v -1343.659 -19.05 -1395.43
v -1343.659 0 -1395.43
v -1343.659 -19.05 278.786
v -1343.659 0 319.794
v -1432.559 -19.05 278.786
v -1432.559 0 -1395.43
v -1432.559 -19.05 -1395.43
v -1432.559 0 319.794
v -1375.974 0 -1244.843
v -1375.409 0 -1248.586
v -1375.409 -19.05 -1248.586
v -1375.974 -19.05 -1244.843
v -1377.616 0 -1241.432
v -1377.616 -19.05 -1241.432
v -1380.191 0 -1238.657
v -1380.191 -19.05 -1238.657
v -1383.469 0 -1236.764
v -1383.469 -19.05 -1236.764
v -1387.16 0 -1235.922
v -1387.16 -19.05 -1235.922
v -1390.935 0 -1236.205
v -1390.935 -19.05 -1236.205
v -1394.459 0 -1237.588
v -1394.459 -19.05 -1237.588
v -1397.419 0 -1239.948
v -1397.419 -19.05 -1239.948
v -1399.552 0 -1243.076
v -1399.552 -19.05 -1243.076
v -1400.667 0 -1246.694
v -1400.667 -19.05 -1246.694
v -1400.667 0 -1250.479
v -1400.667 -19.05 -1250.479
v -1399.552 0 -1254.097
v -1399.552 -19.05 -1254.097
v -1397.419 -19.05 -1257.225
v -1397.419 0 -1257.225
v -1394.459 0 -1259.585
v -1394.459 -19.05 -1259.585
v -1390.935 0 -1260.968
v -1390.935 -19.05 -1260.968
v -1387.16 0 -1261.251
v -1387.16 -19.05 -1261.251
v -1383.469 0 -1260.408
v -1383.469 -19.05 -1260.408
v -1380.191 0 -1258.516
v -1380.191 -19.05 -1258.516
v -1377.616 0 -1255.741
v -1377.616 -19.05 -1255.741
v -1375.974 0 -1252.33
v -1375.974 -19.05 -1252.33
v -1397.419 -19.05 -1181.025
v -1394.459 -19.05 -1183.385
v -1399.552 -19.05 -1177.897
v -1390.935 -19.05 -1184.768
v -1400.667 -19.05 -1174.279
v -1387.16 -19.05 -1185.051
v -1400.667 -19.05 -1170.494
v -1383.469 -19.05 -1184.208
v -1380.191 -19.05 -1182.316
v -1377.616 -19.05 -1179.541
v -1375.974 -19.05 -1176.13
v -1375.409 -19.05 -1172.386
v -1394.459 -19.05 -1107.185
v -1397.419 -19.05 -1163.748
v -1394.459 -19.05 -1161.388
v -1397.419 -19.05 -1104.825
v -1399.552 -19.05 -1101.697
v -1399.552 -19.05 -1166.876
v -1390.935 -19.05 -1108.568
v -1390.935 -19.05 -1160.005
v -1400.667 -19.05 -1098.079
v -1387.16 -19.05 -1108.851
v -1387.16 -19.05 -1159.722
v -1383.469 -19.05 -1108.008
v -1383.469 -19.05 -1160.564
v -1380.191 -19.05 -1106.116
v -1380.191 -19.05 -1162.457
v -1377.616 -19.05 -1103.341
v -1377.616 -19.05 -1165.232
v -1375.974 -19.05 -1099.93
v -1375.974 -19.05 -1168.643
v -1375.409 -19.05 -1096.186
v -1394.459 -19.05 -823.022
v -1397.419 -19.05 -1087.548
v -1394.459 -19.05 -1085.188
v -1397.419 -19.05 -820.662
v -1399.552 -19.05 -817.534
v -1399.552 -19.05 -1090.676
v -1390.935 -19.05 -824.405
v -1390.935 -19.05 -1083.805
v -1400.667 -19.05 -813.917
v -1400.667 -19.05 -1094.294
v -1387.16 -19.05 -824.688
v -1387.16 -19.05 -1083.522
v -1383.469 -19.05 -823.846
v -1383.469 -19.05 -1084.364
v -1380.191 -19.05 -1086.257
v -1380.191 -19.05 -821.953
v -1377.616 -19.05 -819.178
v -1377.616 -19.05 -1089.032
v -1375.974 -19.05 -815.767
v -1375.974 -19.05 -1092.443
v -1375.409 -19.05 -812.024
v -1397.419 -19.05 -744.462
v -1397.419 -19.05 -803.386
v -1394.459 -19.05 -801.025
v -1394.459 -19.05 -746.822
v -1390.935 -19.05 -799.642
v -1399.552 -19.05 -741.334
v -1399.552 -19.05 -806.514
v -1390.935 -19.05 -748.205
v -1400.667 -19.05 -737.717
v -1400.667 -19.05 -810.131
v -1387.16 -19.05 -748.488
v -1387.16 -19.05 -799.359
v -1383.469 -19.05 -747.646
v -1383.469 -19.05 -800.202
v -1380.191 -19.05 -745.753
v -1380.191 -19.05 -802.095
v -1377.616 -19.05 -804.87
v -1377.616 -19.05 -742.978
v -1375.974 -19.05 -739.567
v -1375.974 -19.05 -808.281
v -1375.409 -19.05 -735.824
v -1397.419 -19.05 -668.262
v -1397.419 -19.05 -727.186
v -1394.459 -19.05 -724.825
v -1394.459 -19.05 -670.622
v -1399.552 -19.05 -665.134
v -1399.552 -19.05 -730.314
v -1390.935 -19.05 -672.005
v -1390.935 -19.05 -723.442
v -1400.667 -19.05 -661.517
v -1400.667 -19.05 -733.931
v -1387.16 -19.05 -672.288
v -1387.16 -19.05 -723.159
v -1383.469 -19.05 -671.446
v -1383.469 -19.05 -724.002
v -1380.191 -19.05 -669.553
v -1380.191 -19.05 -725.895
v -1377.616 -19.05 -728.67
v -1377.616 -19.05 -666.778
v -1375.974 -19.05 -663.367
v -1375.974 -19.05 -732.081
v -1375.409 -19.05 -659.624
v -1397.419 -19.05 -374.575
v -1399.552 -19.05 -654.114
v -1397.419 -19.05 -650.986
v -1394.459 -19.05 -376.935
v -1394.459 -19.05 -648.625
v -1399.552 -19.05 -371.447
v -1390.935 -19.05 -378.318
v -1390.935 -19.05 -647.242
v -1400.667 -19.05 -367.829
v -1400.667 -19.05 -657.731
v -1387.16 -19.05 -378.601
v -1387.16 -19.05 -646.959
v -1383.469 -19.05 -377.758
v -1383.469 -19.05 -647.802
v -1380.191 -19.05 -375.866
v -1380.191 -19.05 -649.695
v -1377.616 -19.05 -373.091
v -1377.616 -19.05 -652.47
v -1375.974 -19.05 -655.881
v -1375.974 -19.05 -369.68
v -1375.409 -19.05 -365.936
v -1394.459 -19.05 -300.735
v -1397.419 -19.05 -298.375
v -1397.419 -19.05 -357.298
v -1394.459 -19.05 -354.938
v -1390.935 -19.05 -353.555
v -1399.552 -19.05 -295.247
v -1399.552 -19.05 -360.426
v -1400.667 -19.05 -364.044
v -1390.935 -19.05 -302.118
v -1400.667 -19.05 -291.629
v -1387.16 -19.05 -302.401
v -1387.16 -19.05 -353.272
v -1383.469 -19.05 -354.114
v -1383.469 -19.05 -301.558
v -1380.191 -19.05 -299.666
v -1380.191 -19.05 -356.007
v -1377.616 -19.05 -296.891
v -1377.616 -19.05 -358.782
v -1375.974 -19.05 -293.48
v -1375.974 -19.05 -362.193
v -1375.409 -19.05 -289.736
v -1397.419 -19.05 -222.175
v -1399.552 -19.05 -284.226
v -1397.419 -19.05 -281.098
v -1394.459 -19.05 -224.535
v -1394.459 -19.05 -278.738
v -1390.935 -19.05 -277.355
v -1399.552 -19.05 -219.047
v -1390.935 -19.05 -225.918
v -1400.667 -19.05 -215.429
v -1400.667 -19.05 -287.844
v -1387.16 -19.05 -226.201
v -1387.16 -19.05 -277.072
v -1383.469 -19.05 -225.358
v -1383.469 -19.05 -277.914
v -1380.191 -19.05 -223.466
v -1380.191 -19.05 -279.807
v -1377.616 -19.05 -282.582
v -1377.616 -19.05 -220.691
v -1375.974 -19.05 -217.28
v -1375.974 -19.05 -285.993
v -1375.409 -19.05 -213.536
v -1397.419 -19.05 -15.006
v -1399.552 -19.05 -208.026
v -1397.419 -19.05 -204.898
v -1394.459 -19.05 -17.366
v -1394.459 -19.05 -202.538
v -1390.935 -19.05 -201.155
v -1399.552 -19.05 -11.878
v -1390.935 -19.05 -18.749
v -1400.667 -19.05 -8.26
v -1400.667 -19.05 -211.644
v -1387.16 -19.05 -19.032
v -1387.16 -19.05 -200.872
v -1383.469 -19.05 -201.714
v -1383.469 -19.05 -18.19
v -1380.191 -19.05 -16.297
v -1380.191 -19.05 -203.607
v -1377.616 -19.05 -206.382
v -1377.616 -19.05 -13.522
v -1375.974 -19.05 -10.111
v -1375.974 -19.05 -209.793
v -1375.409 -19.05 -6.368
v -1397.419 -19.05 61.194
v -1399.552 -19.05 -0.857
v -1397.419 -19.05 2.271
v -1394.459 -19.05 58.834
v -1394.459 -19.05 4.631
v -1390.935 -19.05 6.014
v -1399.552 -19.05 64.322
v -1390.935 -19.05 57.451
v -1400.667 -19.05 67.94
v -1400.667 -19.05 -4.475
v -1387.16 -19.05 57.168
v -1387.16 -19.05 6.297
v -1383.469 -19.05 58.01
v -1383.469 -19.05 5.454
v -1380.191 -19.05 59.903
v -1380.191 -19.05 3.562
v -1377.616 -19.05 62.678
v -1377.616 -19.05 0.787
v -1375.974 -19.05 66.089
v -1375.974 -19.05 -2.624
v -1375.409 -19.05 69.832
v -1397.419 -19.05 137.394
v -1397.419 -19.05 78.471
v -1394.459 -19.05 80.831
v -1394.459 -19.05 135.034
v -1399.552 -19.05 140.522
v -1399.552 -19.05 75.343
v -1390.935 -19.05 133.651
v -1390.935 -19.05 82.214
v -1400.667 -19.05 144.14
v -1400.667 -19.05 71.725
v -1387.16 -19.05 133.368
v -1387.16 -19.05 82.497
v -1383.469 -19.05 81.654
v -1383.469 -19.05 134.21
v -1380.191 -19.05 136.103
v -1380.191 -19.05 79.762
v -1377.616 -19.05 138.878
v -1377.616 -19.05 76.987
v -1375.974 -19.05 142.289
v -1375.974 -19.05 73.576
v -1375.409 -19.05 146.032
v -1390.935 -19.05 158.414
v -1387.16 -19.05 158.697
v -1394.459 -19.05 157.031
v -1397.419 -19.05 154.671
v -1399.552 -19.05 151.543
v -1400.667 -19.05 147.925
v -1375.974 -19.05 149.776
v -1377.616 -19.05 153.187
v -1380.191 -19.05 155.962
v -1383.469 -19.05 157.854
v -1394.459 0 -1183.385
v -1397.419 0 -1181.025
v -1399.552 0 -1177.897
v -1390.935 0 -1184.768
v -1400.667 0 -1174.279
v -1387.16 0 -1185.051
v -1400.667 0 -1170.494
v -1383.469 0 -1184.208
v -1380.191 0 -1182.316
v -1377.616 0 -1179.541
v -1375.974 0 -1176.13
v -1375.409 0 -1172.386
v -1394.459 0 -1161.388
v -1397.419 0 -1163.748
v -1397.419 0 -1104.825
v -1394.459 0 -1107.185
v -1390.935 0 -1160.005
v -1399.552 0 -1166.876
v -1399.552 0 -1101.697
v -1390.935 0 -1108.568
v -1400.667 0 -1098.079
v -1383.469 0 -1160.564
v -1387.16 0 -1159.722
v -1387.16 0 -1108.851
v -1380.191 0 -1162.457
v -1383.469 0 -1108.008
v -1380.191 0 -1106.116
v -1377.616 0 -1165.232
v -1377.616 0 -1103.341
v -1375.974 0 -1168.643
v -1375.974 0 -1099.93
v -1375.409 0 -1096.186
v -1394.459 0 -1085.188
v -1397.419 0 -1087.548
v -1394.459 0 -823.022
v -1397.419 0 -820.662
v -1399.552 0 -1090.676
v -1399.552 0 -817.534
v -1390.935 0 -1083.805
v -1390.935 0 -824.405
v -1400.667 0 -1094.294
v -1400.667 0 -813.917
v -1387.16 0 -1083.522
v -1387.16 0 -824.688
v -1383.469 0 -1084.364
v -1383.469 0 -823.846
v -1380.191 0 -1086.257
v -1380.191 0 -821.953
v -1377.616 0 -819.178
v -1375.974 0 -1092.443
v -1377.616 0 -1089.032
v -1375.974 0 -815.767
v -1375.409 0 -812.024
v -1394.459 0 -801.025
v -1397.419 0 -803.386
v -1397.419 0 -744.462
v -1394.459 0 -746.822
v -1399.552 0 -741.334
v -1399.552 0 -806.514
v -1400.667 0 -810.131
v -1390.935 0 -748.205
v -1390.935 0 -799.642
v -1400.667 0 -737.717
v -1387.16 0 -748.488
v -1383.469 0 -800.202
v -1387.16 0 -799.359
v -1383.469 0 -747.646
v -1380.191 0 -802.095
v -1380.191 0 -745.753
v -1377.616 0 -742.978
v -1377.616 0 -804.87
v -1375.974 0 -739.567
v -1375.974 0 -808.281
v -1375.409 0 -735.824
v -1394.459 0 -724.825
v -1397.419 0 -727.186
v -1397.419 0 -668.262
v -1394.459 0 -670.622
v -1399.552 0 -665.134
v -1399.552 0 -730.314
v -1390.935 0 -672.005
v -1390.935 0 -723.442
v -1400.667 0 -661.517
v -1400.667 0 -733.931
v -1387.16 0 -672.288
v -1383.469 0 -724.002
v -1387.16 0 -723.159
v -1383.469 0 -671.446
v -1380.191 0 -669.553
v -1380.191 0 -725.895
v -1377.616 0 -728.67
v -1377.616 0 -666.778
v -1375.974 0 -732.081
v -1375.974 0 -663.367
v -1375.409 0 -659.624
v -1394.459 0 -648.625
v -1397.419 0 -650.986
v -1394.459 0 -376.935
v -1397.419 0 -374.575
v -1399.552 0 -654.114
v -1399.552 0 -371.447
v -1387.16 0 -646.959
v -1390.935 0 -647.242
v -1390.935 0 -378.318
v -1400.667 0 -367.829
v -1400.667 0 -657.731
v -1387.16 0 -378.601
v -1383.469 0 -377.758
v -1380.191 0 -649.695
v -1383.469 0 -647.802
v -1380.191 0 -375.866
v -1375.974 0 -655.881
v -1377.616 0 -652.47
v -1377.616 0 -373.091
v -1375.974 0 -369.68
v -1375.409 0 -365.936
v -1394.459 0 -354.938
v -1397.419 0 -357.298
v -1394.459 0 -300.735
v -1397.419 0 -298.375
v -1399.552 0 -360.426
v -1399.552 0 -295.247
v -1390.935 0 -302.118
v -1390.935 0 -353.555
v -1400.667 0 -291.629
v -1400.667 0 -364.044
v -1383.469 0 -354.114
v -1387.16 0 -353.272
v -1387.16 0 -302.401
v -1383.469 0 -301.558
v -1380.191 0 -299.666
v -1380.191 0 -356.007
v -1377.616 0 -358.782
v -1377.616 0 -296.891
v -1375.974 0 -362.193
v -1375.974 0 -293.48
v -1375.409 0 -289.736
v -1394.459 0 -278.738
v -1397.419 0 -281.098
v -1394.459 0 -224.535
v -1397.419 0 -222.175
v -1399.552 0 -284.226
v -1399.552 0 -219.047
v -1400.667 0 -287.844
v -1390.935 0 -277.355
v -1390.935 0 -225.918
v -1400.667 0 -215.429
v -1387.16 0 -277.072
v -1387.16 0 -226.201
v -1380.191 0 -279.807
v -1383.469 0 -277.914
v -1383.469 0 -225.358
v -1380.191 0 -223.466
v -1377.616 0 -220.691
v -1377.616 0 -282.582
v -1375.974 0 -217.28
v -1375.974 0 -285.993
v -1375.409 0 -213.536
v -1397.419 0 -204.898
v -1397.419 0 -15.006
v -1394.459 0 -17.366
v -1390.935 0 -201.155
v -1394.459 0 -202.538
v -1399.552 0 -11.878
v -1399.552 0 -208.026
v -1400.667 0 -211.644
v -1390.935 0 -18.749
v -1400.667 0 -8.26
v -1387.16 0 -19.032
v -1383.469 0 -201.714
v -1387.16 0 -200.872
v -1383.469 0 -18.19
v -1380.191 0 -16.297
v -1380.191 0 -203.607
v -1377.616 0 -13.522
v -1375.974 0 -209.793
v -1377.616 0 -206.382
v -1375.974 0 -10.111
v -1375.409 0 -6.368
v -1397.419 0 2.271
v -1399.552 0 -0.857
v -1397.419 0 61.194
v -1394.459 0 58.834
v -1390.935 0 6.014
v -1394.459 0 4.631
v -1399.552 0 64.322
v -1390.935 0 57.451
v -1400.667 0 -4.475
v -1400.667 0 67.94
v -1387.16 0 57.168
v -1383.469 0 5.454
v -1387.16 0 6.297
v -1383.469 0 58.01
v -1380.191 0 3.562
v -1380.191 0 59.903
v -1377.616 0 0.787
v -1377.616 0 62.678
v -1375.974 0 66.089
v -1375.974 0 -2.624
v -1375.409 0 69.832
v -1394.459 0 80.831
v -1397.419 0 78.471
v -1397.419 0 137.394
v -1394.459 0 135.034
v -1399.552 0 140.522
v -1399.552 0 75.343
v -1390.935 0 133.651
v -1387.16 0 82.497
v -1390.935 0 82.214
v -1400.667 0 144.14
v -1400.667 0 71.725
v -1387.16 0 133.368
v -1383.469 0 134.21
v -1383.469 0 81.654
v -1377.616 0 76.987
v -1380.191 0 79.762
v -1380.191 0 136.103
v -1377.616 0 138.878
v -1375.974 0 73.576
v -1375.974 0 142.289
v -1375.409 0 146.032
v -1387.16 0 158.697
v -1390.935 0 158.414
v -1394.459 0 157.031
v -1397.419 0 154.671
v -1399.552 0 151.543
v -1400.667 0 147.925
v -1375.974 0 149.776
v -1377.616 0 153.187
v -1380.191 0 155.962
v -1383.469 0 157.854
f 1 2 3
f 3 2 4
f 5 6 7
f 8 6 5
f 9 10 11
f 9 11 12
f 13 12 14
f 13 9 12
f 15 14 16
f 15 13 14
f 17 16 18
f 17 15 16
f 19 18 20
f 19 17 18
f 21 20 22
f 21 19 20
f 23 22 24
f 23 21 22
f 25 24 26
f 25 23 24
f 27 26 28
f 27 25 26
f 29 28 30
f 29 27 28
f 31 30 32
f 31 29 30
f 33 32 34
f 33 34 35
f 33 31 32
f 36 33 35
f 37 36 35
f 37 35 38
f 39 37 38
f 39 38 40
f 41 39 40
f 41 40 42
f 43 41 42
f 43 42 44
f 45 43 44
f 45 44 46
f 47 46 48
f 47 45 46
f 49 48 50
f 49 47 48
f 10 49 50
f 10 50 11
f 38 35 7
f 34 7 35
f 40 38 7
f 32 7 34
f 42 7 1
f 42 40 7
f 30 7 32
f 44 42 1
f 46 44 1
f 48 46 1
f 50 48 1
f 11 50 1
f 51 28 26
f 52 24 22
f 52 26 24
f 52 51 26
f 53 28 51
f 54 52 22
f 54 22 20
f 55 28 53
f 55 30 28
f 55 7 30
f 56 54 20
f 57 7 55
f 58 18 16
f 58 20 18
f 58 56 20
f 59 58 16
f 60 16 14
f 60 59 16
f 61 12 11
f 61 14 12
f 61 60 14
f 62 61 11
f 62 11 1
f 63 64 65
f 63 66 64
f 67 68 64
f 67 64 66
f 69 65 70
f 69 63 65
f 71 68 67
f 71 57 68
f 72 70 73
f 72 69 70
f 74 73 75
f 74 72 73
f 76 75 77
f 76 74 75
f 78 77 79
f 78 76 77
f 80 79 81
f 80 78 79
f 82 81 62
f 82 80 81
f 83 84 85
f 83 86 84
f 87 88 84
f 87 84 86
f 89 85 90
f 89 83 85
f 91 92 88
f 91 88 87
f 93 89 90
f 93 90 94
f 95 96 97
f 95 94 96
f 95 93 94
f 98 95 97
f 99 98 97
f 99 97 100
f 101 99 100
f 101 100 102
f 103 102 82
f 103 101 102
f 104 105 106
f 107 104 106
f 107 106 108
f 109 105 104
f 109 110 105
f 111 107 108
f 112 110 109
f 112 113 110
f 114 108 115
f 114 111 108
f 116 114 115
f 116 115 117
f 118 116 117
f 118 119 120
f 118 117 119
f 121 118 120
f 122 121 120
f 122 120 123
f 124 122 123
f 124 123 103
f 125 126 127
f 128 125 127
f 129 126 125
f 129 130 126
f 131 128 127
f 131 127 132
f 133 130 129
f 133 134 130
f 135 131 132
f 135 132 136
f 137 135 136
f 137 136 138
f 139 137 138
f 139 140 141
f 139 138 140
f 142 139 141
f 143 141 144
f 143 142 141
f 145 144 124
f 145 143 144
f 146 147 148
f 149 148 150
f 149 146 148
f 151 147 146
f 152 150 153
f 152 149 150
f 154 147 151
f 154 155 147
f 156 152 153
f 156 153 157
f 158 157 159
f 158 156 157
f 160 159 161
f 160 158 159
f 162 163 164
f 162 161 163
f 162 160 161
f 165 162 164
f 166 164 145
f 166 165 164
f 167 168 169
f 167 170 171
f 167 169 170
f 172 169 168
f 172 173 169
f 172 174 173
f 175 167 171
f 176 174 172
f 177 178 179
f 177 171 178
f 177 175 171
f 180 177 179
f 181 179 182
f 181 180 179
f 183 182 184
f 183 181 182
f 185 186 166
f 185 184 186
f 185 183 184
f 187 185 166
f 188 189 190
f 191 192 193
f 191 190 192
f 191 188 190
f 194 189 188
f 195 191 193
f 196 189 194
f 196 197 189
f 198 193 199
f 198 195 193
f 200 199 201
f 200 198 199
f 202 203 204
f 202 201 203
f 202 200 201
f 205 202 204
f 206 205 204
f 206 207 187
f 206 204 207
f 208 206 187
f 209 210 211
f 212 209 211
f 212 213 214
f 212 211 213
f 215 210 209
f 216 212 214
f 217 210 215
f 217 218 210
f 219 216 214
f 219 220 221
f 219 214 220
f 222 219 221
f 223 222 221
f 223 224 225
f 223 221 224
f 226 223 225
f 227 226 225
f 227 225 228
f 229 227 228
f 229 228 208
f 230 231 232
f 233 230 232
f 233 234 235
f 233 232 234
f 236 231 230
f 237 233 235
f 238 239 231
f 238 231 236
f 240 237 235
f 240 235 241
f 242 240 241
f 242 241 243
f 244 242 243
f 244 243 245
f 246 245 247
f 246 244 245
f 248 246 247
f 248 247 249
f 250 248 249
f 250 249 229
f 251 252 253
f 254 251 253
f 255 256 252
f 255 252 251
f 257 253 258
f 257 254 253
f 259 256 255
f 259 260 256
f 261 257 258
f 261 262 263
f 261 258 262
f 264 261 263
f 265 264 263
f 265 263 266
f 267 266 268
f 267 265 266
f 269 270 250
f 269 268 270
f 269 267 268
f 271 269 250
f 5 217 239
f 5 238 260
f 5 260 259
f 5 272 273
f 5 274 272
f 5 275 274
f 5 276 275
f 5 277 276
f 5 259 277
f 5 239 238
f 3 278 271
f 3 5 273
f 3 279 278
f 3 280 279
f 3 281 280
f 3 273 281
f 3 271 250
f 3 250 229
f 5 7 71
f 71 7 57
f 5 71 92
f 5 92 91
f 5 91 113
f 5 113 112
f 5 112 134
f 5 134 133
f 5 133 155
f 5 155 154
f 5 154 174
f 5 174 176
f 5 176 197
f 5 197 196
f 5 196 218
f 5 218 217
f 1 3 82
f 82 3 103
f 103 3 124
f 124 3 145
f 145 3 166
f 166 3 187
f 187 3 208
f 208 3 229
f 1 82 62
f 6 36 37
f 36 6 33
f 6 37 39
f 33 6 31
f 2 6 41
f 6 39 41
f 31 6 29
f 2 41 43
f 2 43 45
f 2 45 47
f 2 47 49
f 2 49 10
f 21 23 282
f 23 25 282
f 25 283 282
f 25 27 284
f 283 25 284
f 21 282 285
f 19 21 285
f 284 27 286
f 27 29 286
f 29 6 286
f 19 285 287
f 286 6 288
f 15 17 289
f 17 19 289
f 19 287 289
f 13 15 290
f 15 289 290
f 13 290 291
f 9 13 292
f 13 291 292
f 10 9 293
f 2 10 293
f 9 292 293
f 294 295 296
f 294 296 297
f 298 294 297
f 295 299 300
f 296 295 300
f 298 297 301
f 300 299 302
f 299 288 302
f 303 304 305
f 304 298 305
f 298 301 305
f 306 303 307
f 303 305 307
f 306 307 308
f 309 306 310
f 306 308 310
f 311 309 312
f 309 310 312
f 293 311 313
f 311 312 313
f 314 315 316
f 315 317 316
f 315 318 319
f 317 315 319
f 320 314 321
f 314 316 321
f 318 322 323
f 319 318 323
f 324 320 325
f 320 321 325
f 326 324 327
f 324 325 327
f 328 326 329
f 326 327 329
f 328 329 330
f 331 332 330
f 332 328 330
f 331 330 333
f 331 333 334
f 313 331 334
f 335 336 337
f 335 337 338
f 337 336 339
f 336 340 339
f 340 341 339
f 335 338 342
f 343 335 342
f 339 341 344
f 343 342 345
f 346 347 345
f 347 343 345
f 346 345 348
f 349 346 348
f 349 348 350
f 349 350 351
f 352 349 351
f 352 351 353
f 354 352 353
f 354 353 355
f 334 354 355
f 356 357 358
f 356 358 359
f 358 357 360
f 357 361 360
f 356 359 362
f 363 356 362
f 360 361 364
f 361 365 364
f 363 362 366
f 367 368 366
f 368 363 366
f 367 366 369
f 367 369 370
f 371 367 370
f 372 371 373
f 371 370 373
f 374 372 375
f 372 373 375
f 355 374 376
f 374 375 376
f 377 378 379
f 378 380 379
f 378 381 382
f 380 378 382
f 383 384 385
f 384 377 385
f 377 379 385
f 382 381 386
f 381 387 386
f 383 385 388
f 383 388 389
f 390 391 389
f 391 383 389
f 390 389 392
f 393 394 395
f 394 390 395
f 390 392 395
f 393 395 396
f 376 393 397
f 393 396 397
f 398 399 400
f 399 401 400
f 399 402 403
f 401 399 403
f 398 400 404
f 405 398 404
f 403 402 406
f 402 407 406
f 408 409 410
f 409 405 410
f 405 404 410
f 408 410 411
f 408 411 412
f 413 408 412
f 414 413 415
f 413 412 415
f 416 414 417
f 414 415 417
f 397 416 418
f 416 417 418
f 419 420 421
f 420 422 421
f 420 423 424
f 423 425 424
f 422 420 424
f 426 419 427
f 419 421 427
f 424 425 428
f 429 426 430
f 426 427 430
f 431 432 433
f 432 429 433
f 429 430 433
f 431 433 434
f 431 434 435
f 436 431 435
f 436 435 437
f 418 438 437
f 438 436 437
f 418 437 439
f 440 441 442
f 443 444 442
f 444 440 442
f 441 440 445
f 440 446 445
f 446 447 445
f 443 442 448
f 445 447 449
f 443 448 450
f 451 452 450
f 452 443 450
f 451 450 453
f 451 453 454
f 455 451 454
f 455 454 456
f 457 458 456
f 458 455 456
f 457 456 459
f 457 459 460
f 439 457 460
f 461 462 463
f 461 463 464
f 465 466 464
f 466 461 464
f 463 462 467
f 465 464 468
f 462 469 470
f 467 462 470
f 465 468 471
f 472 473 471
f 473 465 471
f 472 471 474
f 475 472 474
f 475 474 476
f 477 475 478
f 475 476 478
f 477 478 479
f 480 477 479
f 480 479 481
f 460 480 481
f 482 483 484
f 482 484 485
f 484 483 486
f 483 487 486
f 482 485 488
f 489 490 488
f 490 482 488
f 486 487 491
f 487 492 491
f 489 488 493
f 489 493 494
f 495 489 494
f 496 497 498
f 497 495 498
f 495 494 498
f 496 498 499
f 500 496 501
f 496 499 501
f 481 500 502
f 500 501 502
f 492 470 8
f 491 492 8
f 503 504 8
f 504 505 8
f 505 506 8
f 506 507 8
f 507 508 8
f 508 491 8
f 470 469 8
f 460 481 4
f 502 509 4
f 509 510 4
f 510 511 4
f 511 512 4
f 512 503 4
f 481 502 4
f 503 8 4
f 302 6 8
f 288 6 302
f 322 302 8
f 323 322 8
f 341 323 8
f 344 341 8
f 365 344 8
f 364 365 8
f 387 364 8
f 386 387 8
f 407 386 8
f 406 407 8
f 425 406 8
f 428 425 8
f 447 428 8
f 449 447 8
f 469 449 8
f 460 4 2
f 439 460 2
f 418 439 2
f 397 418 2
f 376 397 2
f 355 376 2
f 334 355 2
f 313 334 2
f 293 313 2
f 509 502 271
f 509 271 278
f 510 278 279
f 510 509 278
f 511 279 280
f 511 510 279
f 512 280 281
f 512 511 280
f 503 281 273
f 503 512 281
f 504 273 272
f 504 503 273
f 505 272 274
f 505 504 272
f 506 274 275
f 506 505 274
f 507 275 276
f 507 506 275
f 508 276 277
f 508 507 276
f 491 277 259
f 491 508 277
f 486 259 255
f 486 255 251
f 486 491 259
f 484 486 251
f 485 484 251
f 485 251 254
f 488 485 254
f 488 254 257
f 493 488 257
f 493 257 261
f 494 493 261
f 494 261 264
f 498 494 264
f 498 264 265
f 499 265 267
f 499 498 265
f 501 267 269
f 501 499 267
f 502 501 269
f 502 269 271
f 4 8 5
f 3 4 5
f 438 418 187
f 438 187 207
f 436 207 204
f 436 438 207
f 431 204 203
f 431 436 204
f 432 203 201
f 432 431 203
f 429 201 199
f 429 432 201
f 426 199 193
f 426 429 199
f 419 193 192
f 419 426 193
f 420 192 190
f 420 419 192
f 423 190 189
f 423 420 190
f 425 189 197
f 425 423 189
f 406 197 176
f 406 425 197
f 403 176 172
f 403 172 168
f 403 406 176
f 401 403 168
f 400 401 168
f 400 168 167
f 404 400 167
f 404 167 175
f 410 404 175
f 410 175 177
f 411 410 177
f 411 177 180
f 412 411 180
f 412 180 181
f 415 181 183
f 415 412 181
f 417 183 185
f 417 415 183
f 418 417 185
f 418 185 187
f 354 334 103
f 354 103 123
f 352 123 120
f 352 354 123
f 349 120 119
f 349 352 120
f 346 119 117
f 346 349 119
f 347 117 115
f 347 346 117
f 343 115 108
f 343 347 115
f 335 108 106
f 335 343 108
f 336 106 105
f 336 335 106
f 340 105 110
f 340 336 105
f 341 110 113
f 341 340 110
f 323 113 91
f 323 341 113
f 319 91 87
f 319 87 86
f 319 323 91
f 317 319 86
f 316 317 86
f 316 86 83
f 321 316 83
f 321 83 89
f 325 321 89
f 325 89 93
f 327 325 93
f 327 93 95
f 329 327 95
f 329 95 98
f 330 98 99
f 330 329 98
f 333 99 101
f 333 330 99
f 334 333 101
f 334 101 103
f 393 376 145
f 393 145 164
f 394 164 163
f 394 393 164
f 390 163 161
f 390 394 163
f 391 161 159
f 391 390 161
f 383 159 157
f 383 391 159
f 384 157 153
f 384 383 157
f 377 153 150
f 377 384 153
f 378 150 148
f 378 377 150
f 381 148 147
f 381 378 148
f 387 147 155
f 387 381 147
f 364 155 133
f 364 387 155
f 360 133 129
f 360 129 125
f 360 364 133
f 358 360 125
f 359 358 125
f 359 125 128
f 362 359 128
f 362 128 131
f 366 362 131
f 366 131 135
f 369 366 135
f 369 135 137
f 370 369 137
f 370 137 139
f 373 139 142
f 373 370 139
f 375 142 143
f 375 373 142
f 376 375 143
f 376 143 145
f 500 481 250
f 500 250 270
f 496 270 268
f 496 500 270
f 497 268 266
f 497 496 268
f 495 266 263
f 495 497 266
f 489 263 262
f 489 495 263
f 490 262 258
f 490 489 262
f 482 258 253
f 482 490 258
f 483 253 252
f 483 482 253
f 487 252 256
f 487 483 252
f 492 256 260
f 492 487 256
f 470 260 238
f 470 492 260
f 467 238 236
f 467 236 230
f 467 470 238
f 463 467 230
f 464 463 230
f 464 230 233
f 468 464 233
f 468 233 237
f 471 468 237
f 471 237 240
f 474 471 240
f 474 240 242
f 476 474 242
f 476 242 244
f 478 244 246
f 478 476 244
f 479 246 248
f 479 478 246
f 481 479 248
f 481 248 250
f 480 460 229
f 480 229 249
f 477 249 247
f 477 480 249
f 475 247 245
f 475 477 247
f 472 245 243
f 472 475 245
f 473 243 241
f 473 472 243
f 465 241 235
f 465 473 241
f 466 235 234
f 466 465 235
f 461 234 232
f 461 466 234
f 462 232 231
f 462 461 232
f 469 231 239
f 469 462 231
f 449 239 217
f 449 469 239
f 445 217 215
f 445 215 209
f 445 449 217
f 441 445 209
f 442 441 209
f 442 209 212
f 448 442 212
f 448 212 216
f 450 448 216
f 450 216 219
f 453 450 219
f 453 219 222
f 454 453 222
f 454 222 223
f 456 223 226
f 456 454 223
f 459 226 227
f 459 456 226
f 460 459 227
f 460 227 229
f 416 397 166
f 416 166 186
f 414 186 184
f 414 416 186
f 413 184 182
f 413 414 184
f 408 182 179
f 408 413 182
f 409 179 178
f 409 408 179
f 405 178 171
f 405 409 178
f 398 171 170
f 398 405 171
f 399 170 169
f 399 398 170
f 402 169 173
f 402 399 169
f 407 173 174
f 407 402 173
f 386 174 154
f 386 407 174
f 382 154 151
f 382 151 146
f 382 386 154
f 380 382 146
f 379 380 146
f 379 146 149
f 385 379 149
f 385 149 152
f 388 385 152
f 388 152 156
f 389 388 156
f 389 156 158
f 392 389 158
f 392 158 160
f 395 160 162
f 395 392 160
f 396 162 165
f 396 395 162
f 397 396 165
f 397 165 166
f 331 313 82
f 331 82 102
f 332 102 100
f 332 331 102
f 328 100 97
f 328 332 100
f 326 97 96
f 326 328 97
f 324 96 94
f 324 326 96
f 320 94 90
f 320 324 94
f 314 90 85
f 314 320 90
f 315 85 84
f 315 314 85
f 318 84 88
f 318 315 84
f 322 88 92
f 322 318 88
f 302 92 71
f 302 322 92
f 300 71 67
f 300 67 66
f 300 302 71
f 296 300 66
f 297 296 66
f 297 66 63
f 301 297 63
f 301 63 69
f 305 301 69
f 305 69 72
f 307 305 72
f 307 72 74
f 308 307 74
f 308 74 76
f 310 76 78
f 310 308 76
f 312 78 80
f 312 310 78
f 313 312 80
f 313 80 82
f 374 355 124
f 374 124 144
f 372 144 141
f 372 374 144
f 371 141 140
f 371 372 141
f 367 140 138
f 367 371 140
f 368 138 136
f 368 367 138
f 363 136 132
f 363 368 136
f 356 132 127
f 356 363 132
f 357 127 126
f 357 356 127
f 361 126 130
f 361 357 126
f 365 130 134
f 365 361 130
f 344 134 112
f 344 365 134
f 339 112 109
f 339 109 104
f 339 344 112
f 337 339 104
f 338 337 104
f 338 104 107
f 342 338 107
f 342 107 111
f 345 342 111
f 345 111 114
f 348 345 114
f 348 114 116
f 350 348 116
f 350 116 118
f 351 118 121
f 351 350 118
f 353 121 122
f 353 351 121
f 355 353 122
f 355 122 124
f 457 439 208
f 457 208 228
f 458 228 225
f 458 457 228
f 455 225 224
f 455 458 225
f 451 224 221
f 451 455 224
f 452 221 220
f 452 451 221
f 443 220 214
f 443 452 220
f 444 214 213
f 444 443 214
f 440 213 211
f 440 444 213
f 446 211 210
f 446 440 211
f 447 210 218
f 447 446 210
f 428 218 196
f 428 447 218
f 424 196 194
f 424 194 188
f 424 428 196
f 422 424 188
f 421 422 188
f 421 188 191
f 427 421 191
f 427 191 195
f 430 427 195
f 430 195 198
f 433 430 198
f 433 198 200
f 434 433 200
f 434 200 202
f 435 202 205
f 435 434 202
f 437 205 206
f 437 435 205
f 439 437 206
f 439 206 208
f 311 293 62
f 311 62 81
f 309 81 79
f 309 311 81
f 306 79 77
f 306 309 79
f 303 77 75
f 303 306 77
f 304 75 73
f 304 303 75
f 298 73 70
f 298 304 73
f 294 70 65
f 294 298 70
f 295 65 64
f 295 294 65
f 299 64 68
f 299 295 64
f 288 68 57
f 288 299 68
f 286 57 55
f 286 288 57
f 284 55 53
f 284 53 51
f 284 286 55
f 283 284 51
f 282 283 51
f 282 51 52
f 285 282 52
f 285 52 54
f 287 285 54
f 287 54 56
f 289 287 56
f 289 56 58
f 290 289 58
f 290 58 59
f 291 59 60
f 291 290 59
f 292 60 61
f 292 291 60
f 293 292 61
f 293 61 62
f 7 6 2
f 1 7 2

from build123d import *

# Parameters (mm, degrees)
F0_W     = 88.9
F0_H     = 1715.224484
F0_R     = 12.7
F1_DEPTH = 19.05
F3_DEPTH = 88.901


with BuildPart() as f1:
    # F0 (on Front) → F1 (new body)
    with BuildSketch(Plane.XZ):
        with Locations((-1388.109314, -537.817911)):
            Rectangle(F0_W, F0_H)
        with Locations((-1388.109314, -1248.586403)):
            Circle(F0_R, mode=Mode.SUBTRACT)
        with Locations((-1388.109314, -1172.386403)):
            Circle(F0_R, mode=Mode.SUBTRACT)
        with Locations((-1388.109314, -1096.186403)):
            Circle(F0_R, mode=Mode.SUBTRACT)
        with Locations((-1388.109314, -812.023903)):
            Circle(F0_R, mode=Mode.SUBTRACT)
        with Locations((-1388.109314, -735.823903)):
            Circle(F0_R, mode=Mode.SUBTRACT)
        with Locations((-1388.109314, -659.623903)):
            Circle(F0_R, mode=Mode.SUBTRACT)
        with Locations((-1388.109314, -365.936403)):
            Circle(F0_R, mode=Mode.SUBTRACT)
        with Locations((-1388.109314, -289.736403)):
            Circle(F0_R, mode=Mode.SUBTRACT)
        with Locations((-1388.109314, -213.536403)):
            Circle(F0_R, mode=Mode.SUBTRACT)
        with Locations((-1388.109314, -6.367653)):
            Circle(F0_R, mode=Mode.SUBTRACT)
        with Locations((-1388.109314, 69.832347)):
            Circle(F0_R, mode=Mode.SUBTRACT)
        with Locations((-1388.109314, 146.032347)):
            Circle(F0_R, mode=Mode.SUBTRACT)
    extrude(amount=F1_DEPTH)

    # F2 (on face) → F3 (cut, through all)
    with BuildSketch(Plane(origin=(-1432.559314, 0, 0), x_dir=(0, -1, 0), z_dir=(-1, 0, 0))):
        Polygon((19.05, 319.794331), (0, 319.794331), (19.05, 278.785859), align=None)
    extrude(amount=-F3_DEPTH, mode=Mode.SUBTRACT)


solid = f1.part
